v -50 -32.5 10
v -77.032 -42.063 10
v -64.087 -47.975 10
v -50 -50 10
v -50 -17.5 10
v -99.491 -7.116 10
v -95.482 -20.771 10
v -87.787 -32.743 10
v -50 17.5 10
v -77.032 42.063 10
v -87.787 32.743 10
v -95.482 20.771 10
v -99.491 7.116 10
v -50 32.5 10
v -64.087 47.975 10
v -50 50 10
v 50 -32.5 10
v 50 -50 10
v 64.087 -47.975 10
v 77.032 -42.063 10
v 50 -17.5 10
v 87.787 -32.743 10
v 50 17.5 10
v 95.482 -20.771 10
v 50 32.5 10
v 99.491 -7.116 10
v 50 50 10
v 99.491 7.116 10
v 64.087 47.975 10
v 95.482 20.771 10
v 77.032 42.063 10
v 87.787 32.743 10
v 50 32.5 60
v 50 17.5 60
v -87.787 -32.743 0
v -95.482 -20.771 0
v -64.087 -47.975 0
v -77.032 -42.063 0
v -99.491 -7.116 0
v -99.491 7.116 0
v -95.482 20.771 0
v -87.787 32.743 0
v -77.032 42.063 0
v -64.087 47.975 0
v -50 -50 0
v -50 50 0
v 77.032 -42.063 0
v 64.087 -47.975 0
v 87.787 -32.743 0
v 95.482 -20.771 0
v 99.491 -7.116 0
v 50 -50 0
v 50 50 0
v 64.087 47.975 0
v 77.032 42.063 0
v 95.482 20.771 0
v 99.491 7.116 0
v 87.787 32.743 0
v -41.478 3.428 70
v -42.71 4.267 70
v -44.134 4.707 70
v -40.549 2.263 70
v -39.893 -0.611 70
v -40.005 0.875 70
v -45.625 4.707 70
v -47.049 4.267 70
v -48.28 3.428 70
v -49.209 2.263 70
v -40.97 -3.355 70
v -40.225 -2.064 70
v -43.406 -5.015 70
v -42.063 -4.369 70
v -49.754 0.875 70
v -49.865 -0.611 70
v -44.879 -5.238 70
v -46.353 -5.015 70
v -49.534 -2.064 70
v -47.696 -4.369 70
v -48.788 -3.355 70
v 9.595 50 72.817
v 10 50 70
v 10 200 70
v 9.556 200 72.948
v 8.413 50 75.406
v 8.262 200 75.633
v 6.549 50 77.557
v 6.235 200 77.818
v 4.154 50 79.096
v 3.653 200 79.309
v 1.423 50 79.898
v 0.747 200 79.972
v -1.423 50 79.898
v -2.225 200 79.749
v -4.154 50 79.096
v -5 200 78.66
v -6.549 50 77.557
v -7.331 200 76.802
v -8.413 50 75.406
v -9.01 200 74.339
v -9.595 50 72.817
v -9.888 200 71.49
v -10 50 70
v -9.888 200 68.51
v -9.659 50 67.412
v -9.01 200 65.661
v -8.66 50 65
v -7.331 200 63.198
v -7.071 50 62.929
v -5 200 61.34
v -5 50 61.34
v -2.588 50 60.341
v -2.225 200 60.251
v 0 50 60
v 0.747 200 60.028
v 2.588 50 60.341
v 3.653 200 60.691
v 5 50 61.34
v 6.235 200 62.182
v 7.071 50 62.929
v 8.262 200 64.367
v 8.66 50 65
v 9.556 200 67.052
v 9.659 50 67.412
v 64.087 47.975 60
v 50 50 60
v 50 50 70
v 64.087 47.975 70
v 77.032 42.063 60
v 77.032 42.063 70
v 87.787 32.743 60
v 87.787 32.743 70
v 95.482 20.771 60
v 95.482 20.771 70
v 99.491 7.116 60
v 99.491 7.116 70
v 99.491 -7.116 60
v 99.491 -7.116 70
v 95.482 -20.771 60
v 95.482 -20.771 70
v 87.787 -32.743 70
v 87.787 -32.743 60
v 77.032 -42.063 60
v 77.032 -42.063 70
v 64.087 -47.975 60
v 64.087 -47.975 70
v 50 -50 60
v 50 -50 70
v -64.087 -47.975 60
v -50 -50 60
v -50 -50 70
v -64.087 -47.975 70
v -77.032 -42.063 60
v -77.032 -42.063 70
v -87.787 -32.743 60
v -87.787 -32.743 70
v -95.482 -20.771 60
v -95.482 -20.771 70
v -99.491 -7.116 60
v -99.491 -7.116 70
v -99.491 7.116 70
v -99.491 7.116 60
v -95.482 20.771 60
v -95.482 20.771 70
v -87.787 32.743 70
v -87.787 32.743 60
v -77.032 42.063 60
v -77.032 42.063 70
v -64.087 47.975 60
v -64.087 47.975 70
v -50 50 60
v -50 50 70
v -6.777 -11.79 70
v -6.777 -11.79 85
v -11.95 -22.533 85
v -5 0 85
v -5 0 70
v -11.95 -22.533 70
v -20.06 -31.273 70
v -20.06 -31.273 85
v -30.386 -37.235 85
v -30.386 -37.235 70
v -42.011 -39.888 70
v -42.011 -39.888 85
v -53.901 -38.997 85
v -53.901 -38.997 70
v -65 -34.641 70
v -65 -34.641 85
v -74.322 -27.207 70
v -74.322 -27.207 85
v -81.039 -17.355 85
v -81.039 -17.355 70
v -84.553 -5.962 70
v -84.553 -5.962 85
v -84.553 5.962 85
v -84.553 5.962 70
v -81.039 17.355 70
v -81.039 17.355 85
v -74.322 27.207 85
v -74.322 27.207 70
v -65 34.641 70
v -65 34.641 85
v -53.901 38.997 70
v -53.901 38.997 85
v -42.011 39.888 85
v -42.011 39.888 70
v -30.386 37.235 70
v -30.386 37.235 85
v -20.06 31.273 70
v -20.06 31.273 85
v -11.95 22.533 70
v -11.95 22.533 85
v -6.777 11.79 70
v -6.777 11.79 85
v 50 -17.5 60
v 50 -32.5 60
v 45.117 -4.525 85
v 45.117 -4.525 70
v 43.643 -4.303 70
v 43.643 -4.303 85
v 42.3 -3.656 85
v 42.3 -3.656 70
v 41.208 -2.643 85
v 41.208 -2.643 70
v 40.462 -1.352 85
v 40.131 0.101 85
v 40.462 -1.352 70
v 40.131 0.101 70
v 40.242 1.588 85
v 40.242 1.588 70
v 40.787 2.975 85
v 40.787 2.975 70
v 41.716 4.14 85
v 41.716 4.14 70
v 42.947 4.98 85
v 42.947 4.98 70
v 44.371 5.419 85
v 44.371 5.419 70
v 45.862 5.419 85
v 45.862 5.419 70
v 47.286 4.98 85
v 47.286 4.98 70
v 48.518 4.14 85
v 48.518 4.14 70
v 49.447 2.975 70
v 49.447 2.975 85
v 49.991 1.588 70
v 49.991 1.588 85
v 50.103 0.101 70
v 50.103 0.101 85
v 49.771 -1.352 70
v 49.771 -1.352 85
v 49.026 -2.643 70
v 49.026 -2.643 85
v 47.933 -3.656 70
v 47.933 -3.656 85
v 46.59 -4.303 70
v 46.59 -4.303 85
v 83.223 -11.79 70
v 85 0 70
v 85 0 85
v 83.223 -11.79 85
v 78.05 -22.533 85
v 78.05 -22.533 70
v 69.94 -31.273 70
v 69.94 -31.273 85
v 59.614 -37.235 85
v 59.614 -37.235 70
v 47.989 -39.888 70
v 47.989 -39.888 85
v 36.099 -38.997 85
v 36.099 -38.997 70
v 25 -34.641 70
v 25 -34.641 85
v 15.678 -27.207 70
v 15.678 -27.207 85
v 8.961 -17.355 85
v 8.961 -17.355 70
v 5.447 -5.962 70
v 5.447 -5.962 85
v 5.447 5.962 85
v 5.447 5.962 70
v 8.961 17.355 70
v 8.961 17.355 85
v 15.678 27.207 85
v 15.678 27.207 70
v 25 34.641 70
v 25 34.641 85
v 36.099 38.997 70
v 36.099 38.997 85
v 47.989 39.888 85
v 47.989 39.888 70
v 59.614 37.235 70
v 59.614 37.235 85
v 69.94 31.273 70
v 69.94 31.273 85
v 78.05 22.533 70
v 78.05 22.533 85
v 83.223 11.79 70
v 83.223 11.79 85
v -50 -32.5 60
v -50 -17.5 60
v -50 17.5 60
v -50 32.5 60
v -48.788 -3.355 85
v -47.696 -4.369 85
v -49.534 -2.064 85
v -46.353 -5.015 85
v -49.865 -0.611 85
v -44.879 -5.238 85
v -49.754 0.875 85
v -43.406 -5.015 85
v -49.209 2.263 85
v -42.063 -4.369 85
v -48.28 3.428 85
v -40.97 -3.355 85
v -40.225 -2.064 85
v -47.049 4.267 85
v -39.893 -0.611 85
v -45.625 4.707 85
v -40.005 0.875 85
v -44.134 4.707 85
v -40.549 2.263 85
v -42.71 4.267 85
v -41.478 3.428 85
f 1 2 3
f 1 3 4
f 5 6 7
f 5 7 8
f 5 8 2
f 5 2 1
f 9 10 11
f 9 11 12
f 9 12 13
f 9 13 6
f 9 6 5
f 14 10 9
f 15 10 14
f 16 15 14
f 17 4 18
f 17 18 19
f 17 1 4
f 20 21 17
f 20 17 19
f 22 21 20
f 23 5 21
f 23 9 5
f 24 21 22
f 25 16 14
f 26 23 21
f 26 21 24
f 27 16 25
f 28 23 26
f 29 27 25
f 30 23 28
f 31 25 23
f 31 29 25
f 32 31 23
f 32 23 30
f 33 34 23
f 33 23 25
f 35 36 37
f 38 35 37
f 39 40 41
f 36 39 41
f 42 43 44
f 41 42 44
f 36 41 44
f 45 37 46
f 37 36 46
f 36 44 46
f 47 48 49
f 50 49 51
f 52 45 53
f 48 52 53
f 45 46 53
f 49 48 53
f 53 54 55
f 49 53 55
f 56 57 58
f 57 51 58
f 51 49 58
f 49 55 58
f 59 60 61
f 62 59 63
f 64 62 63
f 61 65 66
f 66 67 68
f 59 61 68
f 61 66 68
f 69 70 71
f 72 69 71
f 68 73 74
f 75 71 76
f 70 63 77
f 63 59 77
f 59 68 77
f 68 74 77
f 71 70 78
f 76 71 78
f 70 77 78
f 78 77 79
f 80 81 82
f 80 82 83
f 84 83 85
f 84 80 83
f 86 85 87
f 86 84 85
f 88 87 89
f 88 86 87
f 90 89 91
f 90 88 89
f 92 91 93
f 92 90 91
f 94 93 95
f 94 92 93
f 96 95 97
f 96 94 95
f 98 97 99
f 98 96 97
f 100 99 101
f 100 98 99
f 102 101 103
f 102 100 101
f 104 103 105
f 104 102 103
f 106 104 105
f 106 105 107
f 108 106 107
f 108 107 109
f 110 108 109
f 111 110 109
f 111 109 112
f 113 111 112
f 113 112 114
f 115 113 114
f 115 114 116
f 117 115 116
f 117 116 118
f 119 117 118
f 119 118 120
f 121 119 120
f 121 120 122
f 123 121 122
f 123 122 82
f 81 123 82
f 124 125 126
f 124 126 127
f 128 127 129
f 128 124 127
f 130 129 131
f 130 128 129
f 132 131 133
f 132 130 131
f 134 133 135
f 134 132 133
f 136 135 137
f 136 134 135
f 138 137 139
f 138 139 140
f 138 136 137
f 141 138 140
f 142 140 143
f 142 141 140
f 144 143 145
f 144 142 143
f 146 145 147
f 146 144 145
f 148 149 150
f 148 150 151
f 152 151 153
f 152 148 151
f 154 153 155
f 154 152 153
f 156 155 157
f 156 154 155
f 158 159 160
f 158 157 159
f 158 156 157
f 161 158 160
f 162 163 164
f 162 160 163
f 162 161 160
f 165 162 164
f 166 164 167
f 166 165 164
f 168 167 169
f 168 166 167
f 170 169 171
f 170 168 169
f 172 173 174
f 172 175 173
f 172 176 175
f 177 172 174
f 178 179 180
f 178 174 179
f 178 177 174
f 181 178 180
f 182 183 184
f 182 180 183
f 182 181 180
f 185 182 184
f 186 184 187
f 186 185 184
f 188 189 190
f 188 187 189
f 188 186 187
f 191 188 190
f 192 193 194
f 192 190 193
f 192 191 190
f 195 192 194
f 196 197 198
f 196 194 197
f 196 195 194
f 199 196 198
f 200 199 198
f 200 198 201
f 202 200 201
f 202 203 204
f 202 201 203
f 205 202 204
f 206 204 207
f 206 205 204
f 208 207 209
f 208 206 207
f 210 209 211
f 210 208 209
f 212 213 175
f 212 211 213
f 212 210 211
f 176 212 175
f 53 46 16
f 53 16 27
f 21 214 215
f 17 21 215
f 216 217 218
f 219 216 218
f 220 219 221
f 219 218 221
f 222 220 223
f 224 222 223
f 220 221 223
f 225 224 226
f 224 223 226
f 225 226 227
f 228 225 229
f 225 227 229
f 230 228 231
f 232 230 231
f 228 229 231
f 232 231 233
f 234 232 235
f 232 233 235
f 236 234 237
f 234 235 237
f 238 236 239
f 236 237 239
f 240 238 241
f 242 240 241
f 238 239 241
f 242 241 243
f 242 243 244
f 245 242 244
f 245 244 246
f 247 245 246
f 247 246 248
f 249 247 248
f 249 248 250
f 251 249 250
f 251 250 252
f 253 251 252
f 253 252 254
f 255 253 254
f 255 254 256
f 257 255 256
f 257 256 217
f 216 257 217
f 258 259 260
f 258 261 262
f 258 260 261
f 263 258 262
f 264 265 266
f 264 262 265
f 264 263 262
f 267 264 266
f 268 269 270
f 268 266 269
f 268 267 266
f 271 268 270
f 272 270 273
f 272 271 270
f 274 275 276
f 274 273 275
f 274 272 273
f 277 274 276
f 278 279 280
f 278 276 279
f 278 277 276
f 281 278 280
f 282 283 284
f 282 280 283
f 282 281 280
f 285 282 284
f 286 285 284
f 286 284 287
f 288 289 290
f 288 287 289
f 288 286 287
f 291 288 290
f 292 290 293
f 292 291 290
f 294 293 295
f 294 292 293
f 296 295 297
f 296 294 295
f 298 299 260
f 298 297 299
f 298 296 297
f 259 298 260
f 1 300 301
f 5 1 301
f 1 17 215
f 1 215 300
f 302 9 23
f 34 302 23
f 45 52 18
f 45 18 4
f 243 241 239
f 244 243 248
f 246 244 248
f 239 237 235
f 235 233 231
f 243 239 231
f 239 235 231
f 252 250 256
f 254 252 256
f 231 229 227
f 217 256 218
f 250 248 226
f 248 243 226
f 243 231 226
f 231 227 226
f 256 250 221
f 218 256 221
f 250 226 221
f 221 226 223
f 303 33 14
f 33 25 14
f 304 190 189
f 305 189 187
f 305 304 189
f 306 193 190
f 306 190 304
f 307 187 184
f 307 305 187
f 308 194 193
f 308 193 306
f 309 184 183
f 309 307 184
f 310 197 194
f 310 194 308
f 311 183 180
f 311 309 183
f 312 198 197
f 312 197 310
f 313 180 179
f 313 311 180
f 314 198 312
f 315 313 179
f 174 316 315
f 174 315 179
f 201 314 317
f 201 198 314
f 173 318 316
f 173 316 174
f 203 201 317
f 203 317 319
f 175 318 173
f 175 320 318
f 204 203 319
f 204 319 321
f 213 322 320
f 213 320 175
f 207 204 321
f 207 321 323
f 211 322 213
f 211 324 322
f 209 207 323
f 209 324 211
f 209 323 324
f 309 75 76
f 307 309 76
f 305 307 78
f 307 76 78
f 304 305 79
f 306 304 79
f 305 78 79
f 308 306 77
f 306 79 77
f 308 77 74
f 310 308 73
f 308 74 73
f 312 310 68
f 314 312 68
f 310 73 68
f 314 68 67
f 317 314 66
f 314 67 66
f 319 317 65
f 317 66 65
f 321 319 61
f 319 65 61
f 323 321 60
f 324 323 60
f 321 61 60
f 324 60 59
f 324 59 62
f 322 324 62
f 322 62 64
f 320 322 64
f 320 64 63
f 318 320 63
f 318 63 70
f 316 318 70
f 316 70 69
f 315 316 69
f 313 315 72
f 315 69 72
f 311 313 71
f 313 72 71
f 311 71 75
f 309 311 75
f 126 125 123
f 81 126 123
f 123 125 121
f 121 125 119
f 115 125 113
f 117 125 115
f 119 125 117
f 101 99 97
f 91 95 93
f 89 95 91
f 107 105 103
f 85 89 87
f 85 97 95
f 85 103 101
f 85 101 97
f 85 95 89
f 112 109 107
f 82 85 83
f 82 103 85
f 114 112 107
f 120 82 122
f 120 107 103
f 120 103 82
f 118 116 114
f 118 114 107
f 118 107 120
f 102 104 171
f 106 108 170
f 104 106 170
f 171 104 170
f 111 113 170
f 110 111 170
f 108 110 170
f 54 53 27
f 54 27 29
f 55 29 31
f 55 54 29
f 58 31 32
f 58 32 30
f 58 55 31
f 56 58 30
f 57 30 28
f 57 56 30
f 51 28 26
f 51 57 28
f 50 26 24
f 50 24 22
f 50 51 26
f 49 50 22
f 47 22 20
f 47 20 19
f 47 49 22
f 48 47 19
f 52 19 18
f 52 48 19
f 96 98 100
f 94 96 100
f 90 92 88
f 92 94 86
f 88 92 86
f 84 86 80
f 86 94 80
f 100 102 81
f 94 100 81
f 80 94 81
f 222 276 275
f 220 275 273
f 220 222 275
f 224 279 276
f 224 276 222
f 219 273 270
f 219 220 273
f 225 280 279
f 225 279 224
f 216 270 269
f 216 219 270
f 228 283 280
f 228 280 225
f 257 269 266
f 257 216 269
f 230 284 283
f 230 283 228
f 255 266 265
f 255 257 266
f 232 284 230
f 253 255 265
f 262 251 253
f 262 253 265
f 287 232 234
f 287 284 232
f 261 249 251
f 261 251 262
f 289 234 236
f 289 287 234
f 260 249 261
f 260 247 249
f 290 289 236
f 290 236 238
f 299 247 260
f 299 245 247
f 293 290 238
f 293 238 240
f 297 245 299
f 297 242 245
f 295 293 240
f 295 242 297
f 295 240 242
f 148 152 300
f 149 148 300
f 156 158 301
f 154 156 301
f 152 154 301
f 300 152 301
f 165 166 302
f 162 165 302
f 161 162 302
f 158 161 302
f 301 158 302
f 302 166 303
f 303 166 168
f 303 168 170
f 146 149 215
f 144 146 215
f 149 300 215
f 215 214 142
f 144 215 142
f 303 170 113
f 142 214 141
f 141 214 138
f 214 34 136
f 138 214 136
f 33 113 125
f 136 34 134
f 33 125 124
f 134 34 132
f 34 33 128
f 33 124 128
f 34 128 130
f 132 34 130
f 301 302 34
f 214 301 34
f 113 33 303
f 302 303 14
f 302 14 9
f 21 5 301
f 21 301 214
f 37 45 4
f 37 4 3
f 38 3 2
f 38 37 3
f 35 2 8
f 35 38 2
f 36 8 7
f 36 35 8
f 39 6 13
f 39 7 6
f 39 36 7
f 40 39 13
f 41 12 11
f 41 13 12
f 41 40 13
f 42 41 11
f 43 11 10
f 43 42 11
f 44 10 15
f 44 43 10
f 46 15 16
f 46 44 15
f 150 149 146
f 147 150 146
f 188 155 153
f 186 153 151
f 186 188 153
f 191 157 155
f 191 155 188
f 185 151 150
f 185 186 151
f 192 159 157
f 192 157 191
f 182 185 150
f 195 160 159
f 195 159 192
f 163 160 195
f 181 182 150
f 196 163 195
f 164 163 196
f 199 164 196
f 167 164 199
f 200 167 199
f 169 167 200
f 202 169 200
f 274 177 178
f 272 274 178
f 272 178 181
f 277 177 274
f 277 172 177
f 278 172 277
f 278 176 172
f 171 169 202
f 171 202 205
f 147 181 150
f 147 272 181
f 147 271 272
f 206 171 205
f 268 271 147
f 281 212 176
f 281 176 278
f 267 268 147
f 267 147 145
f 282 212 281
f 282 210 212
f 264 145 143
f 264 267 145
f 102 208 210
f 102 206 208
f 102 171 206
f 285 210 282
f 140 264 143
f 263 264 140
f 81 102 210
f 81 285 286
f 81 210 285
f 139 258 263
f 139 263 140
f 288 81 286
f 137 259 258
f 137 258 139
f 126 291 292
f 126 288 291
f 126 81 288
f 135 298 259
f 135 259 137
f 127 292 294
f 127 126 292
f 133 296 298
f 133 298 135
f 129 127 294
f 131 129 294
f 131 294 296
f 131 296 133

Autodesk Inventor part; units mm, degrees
ref_plane "YZ Plane" through (0, 0, 0) normal (1, 0, 0) x (0, 1, 0)
ref_plane "XZ Plane" through (0, 0, 0) normal (0, 1, 0) x (-1, 0, 0)
ref_plane "XY Plane" through (0, 0, 0) normal (0, 0, 1) x (1, 0, 0)
sketch "Sketch24" plane through (0, 0, 0) normal (0, 0, 1) x (1, 0, 0)
  line L0 (50, -50) -> (-50, -50)
  line L1 (-50, -50) -> (-50, 50)
  line L2 (-50, 50) -> (50, 50)
  line L3 (50, 50) -> (50, -50)
  line L4 (50, -50) -> (-50, 50) construction
  line L5 (-50, -50) -> (50, 50) construction
  circle A0 centre (50, 0) radius 50
  circle A1 centre (-50, 0) radius 50
  point P0 (0, 0)
  dimension "d55" = 100
  dimension "d56" = 100
  dimension "d57" = 100
  dimension "d58" = 100
extrude "Extrusion9" add sketch "Sketch24" along normal blind 10
sketch "Sketch25" plane through (0, 0, 10) normal (0, 0, 1) x (1, 0, 0)
  line L0 (50, 32.5) -> (-50, 32.5)
  line L1 (-50, 32.5) -> (-50, 17.5)
  line L2 (-50, 17.5) -> (50, 17.5)
  line L3 (50, 17.5) -> (50, 32.5)
  line L4 (50, 32.5) -> (-50, 17.5) construction
  line L5 (-50, 32.5) -> (50, 17.5) construction
  line L6 (50, -32.5) -> (-50, -32.5)
  line L7 (-50, -32.5) -> (-50, -17.5)
  line L8 (-50, -17.5) -> (50, -17.5)
  line L9 (50, -17.5) -> (50, -32.5)
  line L10 (50, -32.5) -> (-50, -17.5) construction
  line L11 (-50, -32.5) -> (50, -17.5) construction
  point P0 (0, 0)
  point P1 (0, 25)
  point P2 (0, -25)
  dimension "d61" = 100
  dimension "d62" = 15
  dimension "d63" = 15
extrude "Extrusion10" add sketch "Sketch25" along normal blind 50
sketch "Sketch38" plane through (0, 0, 60) normal (0, 0, 1) x (1, 0, 0)
  point P0 (0, 0)
sketch "Sketch39" plane through (0, 0, 10) normal (0, 0, 1) x (1, 0, 0)
  line L0 (-50, 17.5) -> (50, 17.5) projected
  point P0 (0, 0)
  dimension "d78" = 17.5
sketch "Sketch40" plane through (0, 0, 60) normal (0, 0, 1) x (1, 0, 0)
  line L0 (50, 50) -> (-50, 50)
  line L1 (-50, 50) -> (-50, -50)
  line L2 (-50, -50) -> (50, -50)
  line L3 (50, -50) -> (50, 50)
  line L4 (50, 50) -> (-50, -50) construction
  line L5 (-50, 50) -> (50, -50) construction
  circle A0 centre (50, 0) radius 50
  circle A1 centre (-50, 0) radius 50
  point P0 (0, 0)
  dimension "d79" = 100
  dimension "d80" = 100
  dimension "d81" = 100
  dimension "d82" = 100
extrude "Extrusion12" add sketch "Sketch40" along normal blind 10
sketch "Sketch43" plane through (0, 0, 70) normal (0, 0, 1) x (1, 0, 0)
  circle A0 centre (45, 0) radius 40
  circle A1 centre (-45, 0) radius 40
  point P0 (0, 0)
  dimension "d87" = 80
  dimension "d88" = 80
extrude "Extrusion13" add sketch "Sketch43" along normal blind 15
thread "Thread1" size "G 3/4-14" class "A" standard "BSP Pipe Threads" length 15
thread "Thread2" size "G 3/4-14" class "A" standard "BSP Pipe Threads" length 15
sketch "Sketch44" plane through (-45, 0, 85) normal (0, 0, 1) x (1, 0, 0)
  point P0 (45, 0)
  point P1 (0.1207, -0.2375)
hole "Hole1" at (-44.8793, -0.2375, 85) direction (0, 0, -1) diameter 10 depth 15
sketch "Sketch45" plane through (45, 0, 85) normal (0, 0, 1) x (1, 0, 0)
  point P0 (-45, 0)
  point P1 (0.1167, 0.4749)
hole "Hole2" at (45.1167, 0.4749, 85) direction (0, 0, -1) diameter 10 depth 15
sketch "Sketch49" plane through (0, 0, 70) normal (0, 0, 1) x (1, 0, 0)
  line L0 (-50, -50) -> (50, -50) projected
  line L1 (-4.7625, -50) -> (-4.7625, -90.4738)
  line L2 (5.1887, -50) -> (5.1887, -90.4738)
  line L3 (5.1887, -90.4738) -> (24.8137, -70.2369) construction
  line L4 (24.8137, -70.2369) -> (-4.7625, -90.4738) construction
  spline S0 degree 2 poles (5.1887, -90.4738) (24.8137, -70.2369) (-4.7625, -90.4738) knots 1 1 1 2 2 2
  point P0 (0, 0)
sketch "Sketch50" plane through (-50, 50, 60) normal (0, 1, 0) x (1, 0, 0)
  line L0 (0, -10) -> (100, -10) projected
  circle A0 centre (50, -10) radius 10
  point P0 (50, 60)
  dimension "d110" = 20
extrude "Extrusion14" add sketch "Sketch50" along normal blind 150
properties part number "base"
